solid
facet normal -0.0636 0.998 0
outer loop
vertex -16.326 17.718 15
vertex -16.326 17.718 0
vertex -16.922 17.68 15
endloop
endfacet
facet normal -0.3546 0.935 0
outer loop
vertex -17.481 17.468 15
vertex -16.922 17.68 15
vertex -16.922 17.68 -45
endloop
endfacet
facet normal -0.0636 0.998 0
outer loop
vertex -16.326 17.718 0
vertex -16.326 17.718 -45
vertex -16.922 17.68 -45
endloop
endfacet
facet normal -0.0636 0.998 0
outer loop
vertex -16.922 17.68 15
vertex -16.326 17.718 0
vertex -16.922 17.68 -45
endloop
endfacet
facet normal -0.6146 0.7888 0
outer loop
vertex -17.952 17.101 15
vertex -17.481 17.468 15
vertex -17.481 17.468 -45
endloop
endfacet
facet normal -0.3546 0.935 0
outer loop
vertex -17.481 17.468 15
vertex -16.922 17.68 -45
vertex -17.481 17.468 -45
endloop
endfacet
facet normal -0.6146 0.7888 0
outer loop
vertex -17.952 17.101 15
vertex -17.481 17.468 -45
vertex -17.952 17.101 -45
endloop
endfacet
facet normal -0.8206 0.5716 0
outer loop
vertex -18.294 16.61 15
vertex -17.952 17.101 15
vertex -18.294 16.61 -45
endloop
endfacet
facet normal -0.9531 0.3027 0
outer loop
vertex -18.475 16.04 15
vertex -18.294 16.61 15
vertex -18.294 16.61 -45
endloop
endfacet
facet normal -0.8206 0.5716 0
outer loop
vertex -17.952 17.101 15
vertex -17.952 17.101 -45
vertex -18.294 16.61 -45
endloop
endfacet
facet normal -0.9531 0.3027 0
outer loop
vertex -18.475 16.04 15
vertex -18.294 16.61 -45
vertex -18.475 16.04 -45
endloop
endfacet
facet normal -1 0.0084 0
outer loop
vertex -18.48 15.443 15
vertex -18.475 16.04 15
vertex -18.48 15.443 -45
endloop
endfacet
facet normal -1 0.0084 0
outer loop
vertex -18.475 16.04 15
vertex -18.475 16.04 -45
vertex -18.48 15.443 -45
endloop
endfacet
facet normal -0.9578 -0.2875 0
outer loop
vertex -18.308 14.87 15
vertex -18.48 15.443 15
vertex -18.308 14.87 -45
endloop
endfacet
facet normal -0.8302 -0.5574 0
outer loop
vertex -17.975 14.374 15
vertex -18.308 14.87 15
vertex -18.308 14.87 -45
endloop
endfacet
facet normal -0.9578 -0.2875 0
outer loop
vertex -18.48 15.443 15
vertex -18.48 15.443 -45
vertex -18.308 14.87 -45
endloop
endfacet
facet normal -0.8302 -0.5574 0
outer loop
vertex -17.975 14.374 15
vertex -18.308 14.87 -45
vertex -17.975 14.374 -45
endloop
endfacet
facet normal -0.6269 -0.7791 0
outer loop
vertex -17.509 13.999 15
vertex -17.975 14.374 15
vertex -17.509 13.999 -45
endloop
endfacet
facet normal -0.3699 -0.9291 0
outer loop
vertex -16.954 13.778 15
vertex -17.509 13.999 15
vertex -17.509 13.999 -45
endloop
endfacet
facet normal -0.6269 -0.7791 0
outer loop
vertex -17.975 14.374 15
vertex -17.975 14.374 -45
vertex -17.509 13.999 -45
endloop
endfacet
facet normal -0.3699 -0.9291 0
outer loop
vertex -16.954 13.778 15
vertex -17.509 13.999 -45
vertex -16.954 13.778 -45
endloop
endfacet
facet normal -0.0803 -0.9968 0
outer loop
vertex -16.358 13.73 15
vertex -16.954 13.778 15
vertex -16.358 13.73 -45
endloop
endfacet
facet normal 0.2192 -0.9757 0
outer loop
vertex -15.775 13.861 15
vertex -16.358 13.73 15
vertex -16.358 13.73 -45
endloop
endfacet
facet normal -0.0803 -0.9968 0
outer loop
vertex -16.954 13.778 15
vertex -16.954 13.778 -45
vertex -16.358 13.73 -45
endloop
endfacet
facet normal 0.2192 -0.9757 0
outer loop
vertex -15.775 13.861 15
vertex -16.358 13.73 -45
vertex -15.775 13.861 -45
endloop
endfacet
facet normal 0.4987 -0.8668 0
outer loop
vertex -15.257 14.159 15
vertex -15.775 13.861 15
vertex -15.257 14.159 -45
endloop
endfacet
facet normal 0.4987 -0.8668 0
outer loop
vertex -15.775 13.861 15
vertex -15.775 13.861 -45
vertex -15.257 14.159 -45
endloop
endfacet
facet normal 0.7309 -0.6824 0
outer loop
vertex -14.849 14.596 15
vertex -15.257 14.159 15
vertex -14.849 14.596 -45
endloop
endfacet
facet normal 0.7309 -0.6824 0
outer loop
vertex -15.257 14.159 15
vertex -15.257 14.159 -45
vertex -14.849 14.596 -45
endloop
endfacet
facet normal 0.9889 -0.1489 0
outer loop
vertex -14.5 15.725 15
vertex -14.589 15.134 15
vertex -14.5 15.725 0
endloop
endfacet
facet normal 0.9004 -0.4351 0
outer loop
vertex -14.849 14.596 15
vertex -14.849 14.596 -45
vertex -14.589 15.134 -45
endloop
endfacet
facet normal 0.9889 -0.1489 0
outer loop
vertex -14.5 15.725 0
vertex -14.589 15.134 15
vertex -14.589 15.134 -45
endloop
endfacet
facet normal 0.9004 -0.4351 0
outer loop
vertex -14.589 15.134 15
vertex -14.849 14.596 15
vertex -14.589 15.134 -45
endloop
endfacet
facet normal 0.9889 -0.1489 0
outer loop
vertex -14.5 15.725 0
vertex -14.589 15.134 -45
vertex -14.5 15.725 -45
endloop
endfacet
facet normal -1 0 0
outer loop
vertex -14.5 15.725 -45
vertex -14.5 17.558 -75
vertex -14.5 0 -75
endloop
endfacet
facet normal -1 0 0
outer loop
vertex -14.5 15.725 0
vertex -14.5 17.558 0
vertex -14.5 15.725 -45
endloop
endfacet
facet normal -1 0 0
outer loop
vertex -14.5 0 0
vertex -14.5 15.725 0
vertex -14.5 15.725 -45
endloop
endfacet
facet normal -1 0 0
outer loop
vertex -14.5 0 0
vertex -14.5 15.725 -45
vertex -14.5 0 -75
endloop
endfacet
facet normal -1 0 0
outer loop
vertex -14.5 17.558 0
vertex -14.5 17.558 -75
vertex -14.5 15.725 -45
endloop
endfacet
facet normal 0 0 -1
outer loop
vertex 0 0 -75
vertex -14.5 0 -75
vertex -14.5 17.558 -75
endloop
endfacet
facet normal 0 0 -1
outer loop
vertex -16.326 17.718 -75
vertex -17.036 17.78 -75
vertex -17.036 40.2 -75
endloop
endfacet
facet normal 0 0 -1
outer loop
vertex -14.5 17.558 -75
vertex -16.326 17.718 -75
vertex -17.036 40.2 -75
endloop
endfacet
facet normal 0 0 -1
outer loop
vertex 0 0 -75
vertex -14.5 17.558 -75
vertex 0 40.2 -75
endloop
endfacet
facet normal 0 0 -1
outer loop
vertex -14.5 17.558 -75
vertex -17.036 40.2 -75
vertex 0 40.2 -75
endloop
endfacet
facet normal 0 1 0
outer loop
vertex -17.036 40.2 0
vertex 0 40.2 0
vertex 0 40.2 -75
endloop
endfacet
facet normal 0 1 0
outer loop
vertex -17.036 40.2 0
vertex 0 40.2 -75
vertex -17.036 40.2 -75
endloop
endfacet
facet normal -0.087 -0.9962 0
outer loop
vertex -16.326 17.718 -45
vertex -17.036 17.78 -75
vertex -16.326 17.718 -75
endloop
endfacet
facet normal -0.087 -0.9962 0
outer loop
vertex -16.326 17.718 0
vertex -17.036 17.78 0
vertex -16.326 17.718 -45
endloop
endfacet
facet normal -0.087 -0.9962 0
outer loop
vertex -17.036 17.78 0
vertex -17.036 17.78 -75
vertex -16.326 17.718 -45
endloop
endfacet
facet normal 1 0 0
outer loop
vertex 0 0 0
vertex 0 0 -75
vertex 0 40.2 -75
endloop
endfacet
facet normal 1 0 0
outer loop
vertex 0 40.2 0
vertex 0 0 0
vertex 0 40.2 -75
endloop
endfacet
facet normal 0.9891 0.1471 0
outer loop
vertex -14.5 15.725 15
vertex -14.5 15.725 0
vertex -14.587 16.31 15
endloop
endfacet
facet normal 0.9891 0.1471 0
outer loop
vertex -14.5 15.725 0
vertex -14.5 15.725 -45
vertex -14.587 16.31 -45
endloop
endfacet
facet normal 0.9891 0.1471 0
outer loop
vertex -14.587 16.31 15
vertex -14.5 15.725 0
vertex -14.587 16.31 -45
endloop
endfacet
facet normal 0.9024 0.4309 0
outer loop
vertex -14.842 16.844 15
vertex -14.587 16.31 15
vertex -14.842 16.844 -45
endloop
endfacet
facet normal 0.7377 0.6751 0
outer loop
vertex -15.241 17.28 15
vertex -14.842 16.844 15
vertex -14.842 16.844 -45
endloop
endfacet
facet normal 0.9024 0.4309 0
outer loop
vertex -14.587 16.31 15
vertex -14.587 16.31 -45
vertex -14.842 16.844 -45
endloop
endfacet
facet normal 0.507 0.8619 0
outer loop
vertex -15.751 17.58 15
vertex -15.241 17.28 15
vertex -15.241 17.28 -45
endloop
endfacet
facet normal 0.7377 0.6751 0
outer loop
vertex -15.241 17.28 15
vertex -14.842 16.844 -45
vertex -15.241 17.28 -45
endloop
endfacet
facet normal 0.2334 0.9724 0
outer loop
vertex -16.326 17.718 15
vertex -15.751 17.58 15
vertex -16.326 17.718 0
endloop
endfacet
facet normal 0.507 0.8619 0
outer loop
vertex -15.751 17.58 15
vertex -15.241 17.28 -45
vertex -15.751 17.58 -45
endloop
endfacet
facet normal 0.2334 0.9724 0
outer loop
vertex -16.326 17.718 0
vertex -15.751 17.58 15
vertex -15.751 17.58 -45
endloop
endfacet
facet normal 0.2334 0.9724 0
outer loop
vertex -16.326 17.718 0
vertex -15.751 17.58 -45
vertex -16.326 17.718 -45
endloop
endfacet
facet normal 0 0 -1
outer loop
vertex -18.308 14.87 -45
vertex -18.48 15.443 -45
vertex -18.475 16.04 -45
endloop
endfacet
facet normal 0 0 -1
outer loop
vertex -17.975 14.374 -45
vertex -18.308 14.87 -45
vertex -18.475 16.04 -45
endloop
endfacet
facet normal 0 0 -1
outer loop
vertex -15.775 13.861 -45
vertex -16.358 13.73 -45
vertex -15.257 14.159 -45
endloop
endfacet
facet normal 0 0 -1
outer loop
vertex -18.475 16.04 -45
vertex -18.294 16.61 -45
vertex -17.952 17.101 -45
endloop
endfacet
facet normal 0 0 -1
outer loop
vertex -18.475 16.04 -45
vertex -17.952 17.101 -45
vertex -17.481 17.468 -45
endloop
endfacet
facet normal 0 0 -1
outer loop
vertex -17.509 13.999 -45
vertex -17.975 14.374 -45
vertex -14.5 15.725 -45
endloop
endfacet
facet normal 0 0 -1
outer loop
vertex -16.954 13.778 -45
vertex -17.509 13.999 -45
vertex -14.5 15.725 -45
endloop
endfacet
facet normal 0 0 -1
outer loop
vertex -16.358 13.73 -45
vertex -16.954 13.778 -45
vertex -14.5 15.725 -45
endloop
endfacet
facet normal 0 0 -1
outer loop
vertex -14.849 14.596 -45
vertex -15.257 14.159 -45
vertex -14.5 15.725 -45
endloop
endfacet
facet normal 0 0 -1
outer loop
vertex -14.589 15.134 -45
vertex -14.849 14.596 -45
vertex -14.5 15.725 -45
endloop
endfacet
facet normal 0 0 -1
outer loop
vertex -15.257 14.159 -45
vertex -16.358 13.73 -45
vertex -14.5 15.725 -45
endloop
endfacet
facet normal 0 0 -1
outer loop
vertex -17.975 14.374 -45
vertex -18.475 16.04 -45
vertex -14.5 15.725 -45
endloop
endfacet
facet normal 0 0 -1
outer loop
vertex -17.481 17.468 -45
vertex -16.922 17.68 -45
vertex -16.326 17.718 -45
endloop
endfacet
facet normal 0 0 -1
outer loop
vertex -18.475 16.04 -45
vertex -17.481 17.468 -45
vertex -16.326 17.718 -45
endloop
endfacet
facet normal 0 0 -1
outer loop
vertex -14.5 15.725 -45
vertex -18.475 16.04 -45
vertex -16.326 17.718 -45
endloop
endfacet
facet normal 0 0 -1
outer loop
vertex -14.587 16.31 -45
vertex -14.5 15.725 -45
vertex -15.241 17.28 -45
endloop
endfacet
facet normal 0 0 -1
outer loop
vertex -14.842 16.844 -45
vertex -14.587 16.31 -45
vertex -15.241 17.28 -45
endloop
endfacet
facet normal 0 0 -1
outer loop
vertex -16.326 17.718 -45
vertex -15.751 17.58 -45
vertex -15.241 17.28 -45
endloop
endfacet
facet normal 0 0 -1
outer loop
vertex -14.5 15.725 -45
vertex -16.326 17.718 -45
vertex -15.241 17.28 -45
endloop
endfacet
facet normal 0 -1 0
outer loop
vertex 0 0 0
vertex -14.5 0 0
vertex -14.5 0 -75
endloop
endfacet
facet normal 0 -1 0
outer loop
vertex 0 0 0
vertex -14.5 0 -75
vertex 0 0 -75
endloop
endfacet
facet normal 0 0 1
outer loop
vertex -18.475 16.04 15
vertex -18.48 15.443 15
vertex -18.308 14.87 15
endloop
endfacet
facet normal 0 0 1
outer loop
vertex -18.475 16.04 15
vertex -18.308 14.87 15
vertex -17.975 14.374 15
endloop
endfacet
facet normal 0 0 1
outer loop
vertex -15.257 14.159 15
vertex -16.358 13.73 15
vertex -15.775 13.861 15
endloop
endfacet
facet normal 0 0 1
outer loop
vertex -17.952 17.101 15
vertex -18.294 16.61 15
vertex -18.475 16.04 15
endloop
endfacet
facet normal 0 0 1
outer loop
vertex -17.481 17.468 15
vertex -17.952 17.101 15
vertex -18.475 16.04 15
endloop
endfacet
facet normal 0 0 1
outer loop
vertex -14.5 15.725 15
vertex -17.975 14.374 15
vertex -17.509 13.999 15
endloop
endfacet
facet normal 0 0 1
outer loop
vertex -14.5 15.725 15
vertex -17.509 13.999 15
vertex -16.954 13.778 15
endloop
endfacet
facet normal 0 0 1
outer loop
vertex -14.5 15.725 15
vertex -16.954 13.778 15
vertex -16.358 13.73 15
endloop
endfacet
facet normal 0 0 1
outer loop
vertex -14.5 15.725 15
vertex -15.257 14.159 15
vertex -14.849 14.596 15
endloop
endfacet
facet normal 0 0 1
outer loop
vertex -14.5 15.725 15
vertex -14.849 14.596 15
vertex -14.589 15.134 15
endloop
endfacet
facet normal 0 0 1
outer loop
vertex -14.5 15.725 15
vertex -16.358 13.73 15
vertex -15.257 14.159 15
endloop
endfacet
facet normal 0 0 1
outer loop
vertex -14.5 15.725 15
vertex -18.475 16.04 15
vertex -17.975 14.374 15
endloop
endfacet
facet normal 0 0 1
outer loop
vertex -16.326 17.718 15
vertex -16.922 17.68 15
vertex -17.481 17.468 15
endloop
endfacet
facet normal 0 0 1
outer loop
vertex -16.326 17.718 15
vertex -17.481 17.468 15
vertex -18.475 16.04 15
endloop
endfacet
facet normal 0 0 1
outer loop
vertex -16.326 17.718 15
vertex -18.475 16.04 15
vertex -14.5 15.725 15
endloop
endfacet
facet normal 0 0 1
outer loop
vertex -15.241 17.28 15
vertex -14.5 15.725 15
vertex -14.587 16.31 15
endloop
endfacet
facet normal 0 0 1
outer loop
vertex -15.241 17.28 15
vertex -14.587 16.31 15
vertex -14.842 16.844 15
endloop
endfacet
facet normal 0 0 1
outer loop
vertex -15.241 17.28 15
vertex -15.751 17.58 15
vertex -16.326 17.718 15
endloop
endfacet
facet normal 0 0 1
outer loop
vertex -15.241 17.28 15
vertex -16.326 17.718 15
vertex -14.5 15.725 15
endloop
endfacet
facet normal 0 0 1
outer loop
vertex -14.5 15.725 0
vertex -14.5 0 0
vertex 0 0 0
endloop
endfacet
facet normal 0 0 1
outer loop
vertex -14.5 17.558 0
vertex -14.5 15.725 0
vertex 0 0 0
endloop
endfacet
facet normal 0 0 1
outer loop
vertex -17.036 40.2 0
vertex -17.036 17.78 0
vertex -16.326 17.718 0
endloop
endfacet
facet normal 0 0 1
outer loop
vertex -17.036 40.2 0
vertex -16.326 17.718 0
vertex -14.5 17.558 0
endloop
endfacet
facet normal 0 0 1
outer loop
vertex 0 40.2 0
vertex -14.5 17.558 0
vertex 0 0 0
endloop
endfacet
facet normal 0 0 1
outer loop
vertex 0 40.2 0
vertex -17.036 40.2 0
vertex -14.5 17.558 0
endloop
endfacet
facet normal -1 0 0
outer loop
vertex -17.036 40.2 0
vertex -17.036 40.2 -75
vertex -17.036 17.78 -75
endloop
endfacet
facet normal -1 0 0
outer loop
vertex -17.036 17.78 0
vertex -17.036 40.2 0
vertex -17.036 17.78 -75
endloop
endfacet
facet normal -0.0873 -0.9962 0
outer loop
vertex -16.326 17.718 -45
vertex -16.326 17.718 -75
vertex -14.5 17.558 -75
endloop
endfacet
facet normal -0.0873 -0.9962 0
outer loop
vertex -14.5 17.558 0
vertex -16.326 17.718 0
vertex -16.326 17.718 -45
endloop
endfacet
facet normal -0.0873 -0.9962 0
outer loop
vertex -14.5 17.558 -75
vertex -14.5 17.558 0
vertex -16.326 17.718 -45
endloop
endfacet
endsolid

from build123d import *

# Parameters (mm, degrees)
F1_DEPTH      = 75
F2_DEPTH      = 45
F2_DEPTH_BACK = 15


with BuildPart() as f1:
    # F0 (on Top) → F1 (new body)
    with BuildSketch(Plane.XY):
        Polygon((-14.5, 0), (0, 0), (0, 40.2), (-17.036, 40.2), (-17.036, 17.78), (-16.3256885076, 17.7178557968), (-14.5, 17.5581287493), (-14.5, 15.7254664013), align=None)
    extrude(amount=-F1_DEPTH)

    # F0 (on Top) → F2 (join, two sides)
    with BuildSketch(Plane.XY) as f2_sk:
        with BuildLine():
            ThreePointArc((-16.3256885076, 17.7178557968), (-17.974554676, 14.3742859886), (-14.5, 15.7254664013))
            ThreePointArc((-14.5, 15.7254664013), (-15.025445324, 17.0766468139), (-16.3256885076, 17.7178557968))
        make_face()
    extrude(amount=-F2_DEPTH)
    extrude(f2_sk.sketch, amount=F2_DEPTH_BACK)


solid = f1.part
